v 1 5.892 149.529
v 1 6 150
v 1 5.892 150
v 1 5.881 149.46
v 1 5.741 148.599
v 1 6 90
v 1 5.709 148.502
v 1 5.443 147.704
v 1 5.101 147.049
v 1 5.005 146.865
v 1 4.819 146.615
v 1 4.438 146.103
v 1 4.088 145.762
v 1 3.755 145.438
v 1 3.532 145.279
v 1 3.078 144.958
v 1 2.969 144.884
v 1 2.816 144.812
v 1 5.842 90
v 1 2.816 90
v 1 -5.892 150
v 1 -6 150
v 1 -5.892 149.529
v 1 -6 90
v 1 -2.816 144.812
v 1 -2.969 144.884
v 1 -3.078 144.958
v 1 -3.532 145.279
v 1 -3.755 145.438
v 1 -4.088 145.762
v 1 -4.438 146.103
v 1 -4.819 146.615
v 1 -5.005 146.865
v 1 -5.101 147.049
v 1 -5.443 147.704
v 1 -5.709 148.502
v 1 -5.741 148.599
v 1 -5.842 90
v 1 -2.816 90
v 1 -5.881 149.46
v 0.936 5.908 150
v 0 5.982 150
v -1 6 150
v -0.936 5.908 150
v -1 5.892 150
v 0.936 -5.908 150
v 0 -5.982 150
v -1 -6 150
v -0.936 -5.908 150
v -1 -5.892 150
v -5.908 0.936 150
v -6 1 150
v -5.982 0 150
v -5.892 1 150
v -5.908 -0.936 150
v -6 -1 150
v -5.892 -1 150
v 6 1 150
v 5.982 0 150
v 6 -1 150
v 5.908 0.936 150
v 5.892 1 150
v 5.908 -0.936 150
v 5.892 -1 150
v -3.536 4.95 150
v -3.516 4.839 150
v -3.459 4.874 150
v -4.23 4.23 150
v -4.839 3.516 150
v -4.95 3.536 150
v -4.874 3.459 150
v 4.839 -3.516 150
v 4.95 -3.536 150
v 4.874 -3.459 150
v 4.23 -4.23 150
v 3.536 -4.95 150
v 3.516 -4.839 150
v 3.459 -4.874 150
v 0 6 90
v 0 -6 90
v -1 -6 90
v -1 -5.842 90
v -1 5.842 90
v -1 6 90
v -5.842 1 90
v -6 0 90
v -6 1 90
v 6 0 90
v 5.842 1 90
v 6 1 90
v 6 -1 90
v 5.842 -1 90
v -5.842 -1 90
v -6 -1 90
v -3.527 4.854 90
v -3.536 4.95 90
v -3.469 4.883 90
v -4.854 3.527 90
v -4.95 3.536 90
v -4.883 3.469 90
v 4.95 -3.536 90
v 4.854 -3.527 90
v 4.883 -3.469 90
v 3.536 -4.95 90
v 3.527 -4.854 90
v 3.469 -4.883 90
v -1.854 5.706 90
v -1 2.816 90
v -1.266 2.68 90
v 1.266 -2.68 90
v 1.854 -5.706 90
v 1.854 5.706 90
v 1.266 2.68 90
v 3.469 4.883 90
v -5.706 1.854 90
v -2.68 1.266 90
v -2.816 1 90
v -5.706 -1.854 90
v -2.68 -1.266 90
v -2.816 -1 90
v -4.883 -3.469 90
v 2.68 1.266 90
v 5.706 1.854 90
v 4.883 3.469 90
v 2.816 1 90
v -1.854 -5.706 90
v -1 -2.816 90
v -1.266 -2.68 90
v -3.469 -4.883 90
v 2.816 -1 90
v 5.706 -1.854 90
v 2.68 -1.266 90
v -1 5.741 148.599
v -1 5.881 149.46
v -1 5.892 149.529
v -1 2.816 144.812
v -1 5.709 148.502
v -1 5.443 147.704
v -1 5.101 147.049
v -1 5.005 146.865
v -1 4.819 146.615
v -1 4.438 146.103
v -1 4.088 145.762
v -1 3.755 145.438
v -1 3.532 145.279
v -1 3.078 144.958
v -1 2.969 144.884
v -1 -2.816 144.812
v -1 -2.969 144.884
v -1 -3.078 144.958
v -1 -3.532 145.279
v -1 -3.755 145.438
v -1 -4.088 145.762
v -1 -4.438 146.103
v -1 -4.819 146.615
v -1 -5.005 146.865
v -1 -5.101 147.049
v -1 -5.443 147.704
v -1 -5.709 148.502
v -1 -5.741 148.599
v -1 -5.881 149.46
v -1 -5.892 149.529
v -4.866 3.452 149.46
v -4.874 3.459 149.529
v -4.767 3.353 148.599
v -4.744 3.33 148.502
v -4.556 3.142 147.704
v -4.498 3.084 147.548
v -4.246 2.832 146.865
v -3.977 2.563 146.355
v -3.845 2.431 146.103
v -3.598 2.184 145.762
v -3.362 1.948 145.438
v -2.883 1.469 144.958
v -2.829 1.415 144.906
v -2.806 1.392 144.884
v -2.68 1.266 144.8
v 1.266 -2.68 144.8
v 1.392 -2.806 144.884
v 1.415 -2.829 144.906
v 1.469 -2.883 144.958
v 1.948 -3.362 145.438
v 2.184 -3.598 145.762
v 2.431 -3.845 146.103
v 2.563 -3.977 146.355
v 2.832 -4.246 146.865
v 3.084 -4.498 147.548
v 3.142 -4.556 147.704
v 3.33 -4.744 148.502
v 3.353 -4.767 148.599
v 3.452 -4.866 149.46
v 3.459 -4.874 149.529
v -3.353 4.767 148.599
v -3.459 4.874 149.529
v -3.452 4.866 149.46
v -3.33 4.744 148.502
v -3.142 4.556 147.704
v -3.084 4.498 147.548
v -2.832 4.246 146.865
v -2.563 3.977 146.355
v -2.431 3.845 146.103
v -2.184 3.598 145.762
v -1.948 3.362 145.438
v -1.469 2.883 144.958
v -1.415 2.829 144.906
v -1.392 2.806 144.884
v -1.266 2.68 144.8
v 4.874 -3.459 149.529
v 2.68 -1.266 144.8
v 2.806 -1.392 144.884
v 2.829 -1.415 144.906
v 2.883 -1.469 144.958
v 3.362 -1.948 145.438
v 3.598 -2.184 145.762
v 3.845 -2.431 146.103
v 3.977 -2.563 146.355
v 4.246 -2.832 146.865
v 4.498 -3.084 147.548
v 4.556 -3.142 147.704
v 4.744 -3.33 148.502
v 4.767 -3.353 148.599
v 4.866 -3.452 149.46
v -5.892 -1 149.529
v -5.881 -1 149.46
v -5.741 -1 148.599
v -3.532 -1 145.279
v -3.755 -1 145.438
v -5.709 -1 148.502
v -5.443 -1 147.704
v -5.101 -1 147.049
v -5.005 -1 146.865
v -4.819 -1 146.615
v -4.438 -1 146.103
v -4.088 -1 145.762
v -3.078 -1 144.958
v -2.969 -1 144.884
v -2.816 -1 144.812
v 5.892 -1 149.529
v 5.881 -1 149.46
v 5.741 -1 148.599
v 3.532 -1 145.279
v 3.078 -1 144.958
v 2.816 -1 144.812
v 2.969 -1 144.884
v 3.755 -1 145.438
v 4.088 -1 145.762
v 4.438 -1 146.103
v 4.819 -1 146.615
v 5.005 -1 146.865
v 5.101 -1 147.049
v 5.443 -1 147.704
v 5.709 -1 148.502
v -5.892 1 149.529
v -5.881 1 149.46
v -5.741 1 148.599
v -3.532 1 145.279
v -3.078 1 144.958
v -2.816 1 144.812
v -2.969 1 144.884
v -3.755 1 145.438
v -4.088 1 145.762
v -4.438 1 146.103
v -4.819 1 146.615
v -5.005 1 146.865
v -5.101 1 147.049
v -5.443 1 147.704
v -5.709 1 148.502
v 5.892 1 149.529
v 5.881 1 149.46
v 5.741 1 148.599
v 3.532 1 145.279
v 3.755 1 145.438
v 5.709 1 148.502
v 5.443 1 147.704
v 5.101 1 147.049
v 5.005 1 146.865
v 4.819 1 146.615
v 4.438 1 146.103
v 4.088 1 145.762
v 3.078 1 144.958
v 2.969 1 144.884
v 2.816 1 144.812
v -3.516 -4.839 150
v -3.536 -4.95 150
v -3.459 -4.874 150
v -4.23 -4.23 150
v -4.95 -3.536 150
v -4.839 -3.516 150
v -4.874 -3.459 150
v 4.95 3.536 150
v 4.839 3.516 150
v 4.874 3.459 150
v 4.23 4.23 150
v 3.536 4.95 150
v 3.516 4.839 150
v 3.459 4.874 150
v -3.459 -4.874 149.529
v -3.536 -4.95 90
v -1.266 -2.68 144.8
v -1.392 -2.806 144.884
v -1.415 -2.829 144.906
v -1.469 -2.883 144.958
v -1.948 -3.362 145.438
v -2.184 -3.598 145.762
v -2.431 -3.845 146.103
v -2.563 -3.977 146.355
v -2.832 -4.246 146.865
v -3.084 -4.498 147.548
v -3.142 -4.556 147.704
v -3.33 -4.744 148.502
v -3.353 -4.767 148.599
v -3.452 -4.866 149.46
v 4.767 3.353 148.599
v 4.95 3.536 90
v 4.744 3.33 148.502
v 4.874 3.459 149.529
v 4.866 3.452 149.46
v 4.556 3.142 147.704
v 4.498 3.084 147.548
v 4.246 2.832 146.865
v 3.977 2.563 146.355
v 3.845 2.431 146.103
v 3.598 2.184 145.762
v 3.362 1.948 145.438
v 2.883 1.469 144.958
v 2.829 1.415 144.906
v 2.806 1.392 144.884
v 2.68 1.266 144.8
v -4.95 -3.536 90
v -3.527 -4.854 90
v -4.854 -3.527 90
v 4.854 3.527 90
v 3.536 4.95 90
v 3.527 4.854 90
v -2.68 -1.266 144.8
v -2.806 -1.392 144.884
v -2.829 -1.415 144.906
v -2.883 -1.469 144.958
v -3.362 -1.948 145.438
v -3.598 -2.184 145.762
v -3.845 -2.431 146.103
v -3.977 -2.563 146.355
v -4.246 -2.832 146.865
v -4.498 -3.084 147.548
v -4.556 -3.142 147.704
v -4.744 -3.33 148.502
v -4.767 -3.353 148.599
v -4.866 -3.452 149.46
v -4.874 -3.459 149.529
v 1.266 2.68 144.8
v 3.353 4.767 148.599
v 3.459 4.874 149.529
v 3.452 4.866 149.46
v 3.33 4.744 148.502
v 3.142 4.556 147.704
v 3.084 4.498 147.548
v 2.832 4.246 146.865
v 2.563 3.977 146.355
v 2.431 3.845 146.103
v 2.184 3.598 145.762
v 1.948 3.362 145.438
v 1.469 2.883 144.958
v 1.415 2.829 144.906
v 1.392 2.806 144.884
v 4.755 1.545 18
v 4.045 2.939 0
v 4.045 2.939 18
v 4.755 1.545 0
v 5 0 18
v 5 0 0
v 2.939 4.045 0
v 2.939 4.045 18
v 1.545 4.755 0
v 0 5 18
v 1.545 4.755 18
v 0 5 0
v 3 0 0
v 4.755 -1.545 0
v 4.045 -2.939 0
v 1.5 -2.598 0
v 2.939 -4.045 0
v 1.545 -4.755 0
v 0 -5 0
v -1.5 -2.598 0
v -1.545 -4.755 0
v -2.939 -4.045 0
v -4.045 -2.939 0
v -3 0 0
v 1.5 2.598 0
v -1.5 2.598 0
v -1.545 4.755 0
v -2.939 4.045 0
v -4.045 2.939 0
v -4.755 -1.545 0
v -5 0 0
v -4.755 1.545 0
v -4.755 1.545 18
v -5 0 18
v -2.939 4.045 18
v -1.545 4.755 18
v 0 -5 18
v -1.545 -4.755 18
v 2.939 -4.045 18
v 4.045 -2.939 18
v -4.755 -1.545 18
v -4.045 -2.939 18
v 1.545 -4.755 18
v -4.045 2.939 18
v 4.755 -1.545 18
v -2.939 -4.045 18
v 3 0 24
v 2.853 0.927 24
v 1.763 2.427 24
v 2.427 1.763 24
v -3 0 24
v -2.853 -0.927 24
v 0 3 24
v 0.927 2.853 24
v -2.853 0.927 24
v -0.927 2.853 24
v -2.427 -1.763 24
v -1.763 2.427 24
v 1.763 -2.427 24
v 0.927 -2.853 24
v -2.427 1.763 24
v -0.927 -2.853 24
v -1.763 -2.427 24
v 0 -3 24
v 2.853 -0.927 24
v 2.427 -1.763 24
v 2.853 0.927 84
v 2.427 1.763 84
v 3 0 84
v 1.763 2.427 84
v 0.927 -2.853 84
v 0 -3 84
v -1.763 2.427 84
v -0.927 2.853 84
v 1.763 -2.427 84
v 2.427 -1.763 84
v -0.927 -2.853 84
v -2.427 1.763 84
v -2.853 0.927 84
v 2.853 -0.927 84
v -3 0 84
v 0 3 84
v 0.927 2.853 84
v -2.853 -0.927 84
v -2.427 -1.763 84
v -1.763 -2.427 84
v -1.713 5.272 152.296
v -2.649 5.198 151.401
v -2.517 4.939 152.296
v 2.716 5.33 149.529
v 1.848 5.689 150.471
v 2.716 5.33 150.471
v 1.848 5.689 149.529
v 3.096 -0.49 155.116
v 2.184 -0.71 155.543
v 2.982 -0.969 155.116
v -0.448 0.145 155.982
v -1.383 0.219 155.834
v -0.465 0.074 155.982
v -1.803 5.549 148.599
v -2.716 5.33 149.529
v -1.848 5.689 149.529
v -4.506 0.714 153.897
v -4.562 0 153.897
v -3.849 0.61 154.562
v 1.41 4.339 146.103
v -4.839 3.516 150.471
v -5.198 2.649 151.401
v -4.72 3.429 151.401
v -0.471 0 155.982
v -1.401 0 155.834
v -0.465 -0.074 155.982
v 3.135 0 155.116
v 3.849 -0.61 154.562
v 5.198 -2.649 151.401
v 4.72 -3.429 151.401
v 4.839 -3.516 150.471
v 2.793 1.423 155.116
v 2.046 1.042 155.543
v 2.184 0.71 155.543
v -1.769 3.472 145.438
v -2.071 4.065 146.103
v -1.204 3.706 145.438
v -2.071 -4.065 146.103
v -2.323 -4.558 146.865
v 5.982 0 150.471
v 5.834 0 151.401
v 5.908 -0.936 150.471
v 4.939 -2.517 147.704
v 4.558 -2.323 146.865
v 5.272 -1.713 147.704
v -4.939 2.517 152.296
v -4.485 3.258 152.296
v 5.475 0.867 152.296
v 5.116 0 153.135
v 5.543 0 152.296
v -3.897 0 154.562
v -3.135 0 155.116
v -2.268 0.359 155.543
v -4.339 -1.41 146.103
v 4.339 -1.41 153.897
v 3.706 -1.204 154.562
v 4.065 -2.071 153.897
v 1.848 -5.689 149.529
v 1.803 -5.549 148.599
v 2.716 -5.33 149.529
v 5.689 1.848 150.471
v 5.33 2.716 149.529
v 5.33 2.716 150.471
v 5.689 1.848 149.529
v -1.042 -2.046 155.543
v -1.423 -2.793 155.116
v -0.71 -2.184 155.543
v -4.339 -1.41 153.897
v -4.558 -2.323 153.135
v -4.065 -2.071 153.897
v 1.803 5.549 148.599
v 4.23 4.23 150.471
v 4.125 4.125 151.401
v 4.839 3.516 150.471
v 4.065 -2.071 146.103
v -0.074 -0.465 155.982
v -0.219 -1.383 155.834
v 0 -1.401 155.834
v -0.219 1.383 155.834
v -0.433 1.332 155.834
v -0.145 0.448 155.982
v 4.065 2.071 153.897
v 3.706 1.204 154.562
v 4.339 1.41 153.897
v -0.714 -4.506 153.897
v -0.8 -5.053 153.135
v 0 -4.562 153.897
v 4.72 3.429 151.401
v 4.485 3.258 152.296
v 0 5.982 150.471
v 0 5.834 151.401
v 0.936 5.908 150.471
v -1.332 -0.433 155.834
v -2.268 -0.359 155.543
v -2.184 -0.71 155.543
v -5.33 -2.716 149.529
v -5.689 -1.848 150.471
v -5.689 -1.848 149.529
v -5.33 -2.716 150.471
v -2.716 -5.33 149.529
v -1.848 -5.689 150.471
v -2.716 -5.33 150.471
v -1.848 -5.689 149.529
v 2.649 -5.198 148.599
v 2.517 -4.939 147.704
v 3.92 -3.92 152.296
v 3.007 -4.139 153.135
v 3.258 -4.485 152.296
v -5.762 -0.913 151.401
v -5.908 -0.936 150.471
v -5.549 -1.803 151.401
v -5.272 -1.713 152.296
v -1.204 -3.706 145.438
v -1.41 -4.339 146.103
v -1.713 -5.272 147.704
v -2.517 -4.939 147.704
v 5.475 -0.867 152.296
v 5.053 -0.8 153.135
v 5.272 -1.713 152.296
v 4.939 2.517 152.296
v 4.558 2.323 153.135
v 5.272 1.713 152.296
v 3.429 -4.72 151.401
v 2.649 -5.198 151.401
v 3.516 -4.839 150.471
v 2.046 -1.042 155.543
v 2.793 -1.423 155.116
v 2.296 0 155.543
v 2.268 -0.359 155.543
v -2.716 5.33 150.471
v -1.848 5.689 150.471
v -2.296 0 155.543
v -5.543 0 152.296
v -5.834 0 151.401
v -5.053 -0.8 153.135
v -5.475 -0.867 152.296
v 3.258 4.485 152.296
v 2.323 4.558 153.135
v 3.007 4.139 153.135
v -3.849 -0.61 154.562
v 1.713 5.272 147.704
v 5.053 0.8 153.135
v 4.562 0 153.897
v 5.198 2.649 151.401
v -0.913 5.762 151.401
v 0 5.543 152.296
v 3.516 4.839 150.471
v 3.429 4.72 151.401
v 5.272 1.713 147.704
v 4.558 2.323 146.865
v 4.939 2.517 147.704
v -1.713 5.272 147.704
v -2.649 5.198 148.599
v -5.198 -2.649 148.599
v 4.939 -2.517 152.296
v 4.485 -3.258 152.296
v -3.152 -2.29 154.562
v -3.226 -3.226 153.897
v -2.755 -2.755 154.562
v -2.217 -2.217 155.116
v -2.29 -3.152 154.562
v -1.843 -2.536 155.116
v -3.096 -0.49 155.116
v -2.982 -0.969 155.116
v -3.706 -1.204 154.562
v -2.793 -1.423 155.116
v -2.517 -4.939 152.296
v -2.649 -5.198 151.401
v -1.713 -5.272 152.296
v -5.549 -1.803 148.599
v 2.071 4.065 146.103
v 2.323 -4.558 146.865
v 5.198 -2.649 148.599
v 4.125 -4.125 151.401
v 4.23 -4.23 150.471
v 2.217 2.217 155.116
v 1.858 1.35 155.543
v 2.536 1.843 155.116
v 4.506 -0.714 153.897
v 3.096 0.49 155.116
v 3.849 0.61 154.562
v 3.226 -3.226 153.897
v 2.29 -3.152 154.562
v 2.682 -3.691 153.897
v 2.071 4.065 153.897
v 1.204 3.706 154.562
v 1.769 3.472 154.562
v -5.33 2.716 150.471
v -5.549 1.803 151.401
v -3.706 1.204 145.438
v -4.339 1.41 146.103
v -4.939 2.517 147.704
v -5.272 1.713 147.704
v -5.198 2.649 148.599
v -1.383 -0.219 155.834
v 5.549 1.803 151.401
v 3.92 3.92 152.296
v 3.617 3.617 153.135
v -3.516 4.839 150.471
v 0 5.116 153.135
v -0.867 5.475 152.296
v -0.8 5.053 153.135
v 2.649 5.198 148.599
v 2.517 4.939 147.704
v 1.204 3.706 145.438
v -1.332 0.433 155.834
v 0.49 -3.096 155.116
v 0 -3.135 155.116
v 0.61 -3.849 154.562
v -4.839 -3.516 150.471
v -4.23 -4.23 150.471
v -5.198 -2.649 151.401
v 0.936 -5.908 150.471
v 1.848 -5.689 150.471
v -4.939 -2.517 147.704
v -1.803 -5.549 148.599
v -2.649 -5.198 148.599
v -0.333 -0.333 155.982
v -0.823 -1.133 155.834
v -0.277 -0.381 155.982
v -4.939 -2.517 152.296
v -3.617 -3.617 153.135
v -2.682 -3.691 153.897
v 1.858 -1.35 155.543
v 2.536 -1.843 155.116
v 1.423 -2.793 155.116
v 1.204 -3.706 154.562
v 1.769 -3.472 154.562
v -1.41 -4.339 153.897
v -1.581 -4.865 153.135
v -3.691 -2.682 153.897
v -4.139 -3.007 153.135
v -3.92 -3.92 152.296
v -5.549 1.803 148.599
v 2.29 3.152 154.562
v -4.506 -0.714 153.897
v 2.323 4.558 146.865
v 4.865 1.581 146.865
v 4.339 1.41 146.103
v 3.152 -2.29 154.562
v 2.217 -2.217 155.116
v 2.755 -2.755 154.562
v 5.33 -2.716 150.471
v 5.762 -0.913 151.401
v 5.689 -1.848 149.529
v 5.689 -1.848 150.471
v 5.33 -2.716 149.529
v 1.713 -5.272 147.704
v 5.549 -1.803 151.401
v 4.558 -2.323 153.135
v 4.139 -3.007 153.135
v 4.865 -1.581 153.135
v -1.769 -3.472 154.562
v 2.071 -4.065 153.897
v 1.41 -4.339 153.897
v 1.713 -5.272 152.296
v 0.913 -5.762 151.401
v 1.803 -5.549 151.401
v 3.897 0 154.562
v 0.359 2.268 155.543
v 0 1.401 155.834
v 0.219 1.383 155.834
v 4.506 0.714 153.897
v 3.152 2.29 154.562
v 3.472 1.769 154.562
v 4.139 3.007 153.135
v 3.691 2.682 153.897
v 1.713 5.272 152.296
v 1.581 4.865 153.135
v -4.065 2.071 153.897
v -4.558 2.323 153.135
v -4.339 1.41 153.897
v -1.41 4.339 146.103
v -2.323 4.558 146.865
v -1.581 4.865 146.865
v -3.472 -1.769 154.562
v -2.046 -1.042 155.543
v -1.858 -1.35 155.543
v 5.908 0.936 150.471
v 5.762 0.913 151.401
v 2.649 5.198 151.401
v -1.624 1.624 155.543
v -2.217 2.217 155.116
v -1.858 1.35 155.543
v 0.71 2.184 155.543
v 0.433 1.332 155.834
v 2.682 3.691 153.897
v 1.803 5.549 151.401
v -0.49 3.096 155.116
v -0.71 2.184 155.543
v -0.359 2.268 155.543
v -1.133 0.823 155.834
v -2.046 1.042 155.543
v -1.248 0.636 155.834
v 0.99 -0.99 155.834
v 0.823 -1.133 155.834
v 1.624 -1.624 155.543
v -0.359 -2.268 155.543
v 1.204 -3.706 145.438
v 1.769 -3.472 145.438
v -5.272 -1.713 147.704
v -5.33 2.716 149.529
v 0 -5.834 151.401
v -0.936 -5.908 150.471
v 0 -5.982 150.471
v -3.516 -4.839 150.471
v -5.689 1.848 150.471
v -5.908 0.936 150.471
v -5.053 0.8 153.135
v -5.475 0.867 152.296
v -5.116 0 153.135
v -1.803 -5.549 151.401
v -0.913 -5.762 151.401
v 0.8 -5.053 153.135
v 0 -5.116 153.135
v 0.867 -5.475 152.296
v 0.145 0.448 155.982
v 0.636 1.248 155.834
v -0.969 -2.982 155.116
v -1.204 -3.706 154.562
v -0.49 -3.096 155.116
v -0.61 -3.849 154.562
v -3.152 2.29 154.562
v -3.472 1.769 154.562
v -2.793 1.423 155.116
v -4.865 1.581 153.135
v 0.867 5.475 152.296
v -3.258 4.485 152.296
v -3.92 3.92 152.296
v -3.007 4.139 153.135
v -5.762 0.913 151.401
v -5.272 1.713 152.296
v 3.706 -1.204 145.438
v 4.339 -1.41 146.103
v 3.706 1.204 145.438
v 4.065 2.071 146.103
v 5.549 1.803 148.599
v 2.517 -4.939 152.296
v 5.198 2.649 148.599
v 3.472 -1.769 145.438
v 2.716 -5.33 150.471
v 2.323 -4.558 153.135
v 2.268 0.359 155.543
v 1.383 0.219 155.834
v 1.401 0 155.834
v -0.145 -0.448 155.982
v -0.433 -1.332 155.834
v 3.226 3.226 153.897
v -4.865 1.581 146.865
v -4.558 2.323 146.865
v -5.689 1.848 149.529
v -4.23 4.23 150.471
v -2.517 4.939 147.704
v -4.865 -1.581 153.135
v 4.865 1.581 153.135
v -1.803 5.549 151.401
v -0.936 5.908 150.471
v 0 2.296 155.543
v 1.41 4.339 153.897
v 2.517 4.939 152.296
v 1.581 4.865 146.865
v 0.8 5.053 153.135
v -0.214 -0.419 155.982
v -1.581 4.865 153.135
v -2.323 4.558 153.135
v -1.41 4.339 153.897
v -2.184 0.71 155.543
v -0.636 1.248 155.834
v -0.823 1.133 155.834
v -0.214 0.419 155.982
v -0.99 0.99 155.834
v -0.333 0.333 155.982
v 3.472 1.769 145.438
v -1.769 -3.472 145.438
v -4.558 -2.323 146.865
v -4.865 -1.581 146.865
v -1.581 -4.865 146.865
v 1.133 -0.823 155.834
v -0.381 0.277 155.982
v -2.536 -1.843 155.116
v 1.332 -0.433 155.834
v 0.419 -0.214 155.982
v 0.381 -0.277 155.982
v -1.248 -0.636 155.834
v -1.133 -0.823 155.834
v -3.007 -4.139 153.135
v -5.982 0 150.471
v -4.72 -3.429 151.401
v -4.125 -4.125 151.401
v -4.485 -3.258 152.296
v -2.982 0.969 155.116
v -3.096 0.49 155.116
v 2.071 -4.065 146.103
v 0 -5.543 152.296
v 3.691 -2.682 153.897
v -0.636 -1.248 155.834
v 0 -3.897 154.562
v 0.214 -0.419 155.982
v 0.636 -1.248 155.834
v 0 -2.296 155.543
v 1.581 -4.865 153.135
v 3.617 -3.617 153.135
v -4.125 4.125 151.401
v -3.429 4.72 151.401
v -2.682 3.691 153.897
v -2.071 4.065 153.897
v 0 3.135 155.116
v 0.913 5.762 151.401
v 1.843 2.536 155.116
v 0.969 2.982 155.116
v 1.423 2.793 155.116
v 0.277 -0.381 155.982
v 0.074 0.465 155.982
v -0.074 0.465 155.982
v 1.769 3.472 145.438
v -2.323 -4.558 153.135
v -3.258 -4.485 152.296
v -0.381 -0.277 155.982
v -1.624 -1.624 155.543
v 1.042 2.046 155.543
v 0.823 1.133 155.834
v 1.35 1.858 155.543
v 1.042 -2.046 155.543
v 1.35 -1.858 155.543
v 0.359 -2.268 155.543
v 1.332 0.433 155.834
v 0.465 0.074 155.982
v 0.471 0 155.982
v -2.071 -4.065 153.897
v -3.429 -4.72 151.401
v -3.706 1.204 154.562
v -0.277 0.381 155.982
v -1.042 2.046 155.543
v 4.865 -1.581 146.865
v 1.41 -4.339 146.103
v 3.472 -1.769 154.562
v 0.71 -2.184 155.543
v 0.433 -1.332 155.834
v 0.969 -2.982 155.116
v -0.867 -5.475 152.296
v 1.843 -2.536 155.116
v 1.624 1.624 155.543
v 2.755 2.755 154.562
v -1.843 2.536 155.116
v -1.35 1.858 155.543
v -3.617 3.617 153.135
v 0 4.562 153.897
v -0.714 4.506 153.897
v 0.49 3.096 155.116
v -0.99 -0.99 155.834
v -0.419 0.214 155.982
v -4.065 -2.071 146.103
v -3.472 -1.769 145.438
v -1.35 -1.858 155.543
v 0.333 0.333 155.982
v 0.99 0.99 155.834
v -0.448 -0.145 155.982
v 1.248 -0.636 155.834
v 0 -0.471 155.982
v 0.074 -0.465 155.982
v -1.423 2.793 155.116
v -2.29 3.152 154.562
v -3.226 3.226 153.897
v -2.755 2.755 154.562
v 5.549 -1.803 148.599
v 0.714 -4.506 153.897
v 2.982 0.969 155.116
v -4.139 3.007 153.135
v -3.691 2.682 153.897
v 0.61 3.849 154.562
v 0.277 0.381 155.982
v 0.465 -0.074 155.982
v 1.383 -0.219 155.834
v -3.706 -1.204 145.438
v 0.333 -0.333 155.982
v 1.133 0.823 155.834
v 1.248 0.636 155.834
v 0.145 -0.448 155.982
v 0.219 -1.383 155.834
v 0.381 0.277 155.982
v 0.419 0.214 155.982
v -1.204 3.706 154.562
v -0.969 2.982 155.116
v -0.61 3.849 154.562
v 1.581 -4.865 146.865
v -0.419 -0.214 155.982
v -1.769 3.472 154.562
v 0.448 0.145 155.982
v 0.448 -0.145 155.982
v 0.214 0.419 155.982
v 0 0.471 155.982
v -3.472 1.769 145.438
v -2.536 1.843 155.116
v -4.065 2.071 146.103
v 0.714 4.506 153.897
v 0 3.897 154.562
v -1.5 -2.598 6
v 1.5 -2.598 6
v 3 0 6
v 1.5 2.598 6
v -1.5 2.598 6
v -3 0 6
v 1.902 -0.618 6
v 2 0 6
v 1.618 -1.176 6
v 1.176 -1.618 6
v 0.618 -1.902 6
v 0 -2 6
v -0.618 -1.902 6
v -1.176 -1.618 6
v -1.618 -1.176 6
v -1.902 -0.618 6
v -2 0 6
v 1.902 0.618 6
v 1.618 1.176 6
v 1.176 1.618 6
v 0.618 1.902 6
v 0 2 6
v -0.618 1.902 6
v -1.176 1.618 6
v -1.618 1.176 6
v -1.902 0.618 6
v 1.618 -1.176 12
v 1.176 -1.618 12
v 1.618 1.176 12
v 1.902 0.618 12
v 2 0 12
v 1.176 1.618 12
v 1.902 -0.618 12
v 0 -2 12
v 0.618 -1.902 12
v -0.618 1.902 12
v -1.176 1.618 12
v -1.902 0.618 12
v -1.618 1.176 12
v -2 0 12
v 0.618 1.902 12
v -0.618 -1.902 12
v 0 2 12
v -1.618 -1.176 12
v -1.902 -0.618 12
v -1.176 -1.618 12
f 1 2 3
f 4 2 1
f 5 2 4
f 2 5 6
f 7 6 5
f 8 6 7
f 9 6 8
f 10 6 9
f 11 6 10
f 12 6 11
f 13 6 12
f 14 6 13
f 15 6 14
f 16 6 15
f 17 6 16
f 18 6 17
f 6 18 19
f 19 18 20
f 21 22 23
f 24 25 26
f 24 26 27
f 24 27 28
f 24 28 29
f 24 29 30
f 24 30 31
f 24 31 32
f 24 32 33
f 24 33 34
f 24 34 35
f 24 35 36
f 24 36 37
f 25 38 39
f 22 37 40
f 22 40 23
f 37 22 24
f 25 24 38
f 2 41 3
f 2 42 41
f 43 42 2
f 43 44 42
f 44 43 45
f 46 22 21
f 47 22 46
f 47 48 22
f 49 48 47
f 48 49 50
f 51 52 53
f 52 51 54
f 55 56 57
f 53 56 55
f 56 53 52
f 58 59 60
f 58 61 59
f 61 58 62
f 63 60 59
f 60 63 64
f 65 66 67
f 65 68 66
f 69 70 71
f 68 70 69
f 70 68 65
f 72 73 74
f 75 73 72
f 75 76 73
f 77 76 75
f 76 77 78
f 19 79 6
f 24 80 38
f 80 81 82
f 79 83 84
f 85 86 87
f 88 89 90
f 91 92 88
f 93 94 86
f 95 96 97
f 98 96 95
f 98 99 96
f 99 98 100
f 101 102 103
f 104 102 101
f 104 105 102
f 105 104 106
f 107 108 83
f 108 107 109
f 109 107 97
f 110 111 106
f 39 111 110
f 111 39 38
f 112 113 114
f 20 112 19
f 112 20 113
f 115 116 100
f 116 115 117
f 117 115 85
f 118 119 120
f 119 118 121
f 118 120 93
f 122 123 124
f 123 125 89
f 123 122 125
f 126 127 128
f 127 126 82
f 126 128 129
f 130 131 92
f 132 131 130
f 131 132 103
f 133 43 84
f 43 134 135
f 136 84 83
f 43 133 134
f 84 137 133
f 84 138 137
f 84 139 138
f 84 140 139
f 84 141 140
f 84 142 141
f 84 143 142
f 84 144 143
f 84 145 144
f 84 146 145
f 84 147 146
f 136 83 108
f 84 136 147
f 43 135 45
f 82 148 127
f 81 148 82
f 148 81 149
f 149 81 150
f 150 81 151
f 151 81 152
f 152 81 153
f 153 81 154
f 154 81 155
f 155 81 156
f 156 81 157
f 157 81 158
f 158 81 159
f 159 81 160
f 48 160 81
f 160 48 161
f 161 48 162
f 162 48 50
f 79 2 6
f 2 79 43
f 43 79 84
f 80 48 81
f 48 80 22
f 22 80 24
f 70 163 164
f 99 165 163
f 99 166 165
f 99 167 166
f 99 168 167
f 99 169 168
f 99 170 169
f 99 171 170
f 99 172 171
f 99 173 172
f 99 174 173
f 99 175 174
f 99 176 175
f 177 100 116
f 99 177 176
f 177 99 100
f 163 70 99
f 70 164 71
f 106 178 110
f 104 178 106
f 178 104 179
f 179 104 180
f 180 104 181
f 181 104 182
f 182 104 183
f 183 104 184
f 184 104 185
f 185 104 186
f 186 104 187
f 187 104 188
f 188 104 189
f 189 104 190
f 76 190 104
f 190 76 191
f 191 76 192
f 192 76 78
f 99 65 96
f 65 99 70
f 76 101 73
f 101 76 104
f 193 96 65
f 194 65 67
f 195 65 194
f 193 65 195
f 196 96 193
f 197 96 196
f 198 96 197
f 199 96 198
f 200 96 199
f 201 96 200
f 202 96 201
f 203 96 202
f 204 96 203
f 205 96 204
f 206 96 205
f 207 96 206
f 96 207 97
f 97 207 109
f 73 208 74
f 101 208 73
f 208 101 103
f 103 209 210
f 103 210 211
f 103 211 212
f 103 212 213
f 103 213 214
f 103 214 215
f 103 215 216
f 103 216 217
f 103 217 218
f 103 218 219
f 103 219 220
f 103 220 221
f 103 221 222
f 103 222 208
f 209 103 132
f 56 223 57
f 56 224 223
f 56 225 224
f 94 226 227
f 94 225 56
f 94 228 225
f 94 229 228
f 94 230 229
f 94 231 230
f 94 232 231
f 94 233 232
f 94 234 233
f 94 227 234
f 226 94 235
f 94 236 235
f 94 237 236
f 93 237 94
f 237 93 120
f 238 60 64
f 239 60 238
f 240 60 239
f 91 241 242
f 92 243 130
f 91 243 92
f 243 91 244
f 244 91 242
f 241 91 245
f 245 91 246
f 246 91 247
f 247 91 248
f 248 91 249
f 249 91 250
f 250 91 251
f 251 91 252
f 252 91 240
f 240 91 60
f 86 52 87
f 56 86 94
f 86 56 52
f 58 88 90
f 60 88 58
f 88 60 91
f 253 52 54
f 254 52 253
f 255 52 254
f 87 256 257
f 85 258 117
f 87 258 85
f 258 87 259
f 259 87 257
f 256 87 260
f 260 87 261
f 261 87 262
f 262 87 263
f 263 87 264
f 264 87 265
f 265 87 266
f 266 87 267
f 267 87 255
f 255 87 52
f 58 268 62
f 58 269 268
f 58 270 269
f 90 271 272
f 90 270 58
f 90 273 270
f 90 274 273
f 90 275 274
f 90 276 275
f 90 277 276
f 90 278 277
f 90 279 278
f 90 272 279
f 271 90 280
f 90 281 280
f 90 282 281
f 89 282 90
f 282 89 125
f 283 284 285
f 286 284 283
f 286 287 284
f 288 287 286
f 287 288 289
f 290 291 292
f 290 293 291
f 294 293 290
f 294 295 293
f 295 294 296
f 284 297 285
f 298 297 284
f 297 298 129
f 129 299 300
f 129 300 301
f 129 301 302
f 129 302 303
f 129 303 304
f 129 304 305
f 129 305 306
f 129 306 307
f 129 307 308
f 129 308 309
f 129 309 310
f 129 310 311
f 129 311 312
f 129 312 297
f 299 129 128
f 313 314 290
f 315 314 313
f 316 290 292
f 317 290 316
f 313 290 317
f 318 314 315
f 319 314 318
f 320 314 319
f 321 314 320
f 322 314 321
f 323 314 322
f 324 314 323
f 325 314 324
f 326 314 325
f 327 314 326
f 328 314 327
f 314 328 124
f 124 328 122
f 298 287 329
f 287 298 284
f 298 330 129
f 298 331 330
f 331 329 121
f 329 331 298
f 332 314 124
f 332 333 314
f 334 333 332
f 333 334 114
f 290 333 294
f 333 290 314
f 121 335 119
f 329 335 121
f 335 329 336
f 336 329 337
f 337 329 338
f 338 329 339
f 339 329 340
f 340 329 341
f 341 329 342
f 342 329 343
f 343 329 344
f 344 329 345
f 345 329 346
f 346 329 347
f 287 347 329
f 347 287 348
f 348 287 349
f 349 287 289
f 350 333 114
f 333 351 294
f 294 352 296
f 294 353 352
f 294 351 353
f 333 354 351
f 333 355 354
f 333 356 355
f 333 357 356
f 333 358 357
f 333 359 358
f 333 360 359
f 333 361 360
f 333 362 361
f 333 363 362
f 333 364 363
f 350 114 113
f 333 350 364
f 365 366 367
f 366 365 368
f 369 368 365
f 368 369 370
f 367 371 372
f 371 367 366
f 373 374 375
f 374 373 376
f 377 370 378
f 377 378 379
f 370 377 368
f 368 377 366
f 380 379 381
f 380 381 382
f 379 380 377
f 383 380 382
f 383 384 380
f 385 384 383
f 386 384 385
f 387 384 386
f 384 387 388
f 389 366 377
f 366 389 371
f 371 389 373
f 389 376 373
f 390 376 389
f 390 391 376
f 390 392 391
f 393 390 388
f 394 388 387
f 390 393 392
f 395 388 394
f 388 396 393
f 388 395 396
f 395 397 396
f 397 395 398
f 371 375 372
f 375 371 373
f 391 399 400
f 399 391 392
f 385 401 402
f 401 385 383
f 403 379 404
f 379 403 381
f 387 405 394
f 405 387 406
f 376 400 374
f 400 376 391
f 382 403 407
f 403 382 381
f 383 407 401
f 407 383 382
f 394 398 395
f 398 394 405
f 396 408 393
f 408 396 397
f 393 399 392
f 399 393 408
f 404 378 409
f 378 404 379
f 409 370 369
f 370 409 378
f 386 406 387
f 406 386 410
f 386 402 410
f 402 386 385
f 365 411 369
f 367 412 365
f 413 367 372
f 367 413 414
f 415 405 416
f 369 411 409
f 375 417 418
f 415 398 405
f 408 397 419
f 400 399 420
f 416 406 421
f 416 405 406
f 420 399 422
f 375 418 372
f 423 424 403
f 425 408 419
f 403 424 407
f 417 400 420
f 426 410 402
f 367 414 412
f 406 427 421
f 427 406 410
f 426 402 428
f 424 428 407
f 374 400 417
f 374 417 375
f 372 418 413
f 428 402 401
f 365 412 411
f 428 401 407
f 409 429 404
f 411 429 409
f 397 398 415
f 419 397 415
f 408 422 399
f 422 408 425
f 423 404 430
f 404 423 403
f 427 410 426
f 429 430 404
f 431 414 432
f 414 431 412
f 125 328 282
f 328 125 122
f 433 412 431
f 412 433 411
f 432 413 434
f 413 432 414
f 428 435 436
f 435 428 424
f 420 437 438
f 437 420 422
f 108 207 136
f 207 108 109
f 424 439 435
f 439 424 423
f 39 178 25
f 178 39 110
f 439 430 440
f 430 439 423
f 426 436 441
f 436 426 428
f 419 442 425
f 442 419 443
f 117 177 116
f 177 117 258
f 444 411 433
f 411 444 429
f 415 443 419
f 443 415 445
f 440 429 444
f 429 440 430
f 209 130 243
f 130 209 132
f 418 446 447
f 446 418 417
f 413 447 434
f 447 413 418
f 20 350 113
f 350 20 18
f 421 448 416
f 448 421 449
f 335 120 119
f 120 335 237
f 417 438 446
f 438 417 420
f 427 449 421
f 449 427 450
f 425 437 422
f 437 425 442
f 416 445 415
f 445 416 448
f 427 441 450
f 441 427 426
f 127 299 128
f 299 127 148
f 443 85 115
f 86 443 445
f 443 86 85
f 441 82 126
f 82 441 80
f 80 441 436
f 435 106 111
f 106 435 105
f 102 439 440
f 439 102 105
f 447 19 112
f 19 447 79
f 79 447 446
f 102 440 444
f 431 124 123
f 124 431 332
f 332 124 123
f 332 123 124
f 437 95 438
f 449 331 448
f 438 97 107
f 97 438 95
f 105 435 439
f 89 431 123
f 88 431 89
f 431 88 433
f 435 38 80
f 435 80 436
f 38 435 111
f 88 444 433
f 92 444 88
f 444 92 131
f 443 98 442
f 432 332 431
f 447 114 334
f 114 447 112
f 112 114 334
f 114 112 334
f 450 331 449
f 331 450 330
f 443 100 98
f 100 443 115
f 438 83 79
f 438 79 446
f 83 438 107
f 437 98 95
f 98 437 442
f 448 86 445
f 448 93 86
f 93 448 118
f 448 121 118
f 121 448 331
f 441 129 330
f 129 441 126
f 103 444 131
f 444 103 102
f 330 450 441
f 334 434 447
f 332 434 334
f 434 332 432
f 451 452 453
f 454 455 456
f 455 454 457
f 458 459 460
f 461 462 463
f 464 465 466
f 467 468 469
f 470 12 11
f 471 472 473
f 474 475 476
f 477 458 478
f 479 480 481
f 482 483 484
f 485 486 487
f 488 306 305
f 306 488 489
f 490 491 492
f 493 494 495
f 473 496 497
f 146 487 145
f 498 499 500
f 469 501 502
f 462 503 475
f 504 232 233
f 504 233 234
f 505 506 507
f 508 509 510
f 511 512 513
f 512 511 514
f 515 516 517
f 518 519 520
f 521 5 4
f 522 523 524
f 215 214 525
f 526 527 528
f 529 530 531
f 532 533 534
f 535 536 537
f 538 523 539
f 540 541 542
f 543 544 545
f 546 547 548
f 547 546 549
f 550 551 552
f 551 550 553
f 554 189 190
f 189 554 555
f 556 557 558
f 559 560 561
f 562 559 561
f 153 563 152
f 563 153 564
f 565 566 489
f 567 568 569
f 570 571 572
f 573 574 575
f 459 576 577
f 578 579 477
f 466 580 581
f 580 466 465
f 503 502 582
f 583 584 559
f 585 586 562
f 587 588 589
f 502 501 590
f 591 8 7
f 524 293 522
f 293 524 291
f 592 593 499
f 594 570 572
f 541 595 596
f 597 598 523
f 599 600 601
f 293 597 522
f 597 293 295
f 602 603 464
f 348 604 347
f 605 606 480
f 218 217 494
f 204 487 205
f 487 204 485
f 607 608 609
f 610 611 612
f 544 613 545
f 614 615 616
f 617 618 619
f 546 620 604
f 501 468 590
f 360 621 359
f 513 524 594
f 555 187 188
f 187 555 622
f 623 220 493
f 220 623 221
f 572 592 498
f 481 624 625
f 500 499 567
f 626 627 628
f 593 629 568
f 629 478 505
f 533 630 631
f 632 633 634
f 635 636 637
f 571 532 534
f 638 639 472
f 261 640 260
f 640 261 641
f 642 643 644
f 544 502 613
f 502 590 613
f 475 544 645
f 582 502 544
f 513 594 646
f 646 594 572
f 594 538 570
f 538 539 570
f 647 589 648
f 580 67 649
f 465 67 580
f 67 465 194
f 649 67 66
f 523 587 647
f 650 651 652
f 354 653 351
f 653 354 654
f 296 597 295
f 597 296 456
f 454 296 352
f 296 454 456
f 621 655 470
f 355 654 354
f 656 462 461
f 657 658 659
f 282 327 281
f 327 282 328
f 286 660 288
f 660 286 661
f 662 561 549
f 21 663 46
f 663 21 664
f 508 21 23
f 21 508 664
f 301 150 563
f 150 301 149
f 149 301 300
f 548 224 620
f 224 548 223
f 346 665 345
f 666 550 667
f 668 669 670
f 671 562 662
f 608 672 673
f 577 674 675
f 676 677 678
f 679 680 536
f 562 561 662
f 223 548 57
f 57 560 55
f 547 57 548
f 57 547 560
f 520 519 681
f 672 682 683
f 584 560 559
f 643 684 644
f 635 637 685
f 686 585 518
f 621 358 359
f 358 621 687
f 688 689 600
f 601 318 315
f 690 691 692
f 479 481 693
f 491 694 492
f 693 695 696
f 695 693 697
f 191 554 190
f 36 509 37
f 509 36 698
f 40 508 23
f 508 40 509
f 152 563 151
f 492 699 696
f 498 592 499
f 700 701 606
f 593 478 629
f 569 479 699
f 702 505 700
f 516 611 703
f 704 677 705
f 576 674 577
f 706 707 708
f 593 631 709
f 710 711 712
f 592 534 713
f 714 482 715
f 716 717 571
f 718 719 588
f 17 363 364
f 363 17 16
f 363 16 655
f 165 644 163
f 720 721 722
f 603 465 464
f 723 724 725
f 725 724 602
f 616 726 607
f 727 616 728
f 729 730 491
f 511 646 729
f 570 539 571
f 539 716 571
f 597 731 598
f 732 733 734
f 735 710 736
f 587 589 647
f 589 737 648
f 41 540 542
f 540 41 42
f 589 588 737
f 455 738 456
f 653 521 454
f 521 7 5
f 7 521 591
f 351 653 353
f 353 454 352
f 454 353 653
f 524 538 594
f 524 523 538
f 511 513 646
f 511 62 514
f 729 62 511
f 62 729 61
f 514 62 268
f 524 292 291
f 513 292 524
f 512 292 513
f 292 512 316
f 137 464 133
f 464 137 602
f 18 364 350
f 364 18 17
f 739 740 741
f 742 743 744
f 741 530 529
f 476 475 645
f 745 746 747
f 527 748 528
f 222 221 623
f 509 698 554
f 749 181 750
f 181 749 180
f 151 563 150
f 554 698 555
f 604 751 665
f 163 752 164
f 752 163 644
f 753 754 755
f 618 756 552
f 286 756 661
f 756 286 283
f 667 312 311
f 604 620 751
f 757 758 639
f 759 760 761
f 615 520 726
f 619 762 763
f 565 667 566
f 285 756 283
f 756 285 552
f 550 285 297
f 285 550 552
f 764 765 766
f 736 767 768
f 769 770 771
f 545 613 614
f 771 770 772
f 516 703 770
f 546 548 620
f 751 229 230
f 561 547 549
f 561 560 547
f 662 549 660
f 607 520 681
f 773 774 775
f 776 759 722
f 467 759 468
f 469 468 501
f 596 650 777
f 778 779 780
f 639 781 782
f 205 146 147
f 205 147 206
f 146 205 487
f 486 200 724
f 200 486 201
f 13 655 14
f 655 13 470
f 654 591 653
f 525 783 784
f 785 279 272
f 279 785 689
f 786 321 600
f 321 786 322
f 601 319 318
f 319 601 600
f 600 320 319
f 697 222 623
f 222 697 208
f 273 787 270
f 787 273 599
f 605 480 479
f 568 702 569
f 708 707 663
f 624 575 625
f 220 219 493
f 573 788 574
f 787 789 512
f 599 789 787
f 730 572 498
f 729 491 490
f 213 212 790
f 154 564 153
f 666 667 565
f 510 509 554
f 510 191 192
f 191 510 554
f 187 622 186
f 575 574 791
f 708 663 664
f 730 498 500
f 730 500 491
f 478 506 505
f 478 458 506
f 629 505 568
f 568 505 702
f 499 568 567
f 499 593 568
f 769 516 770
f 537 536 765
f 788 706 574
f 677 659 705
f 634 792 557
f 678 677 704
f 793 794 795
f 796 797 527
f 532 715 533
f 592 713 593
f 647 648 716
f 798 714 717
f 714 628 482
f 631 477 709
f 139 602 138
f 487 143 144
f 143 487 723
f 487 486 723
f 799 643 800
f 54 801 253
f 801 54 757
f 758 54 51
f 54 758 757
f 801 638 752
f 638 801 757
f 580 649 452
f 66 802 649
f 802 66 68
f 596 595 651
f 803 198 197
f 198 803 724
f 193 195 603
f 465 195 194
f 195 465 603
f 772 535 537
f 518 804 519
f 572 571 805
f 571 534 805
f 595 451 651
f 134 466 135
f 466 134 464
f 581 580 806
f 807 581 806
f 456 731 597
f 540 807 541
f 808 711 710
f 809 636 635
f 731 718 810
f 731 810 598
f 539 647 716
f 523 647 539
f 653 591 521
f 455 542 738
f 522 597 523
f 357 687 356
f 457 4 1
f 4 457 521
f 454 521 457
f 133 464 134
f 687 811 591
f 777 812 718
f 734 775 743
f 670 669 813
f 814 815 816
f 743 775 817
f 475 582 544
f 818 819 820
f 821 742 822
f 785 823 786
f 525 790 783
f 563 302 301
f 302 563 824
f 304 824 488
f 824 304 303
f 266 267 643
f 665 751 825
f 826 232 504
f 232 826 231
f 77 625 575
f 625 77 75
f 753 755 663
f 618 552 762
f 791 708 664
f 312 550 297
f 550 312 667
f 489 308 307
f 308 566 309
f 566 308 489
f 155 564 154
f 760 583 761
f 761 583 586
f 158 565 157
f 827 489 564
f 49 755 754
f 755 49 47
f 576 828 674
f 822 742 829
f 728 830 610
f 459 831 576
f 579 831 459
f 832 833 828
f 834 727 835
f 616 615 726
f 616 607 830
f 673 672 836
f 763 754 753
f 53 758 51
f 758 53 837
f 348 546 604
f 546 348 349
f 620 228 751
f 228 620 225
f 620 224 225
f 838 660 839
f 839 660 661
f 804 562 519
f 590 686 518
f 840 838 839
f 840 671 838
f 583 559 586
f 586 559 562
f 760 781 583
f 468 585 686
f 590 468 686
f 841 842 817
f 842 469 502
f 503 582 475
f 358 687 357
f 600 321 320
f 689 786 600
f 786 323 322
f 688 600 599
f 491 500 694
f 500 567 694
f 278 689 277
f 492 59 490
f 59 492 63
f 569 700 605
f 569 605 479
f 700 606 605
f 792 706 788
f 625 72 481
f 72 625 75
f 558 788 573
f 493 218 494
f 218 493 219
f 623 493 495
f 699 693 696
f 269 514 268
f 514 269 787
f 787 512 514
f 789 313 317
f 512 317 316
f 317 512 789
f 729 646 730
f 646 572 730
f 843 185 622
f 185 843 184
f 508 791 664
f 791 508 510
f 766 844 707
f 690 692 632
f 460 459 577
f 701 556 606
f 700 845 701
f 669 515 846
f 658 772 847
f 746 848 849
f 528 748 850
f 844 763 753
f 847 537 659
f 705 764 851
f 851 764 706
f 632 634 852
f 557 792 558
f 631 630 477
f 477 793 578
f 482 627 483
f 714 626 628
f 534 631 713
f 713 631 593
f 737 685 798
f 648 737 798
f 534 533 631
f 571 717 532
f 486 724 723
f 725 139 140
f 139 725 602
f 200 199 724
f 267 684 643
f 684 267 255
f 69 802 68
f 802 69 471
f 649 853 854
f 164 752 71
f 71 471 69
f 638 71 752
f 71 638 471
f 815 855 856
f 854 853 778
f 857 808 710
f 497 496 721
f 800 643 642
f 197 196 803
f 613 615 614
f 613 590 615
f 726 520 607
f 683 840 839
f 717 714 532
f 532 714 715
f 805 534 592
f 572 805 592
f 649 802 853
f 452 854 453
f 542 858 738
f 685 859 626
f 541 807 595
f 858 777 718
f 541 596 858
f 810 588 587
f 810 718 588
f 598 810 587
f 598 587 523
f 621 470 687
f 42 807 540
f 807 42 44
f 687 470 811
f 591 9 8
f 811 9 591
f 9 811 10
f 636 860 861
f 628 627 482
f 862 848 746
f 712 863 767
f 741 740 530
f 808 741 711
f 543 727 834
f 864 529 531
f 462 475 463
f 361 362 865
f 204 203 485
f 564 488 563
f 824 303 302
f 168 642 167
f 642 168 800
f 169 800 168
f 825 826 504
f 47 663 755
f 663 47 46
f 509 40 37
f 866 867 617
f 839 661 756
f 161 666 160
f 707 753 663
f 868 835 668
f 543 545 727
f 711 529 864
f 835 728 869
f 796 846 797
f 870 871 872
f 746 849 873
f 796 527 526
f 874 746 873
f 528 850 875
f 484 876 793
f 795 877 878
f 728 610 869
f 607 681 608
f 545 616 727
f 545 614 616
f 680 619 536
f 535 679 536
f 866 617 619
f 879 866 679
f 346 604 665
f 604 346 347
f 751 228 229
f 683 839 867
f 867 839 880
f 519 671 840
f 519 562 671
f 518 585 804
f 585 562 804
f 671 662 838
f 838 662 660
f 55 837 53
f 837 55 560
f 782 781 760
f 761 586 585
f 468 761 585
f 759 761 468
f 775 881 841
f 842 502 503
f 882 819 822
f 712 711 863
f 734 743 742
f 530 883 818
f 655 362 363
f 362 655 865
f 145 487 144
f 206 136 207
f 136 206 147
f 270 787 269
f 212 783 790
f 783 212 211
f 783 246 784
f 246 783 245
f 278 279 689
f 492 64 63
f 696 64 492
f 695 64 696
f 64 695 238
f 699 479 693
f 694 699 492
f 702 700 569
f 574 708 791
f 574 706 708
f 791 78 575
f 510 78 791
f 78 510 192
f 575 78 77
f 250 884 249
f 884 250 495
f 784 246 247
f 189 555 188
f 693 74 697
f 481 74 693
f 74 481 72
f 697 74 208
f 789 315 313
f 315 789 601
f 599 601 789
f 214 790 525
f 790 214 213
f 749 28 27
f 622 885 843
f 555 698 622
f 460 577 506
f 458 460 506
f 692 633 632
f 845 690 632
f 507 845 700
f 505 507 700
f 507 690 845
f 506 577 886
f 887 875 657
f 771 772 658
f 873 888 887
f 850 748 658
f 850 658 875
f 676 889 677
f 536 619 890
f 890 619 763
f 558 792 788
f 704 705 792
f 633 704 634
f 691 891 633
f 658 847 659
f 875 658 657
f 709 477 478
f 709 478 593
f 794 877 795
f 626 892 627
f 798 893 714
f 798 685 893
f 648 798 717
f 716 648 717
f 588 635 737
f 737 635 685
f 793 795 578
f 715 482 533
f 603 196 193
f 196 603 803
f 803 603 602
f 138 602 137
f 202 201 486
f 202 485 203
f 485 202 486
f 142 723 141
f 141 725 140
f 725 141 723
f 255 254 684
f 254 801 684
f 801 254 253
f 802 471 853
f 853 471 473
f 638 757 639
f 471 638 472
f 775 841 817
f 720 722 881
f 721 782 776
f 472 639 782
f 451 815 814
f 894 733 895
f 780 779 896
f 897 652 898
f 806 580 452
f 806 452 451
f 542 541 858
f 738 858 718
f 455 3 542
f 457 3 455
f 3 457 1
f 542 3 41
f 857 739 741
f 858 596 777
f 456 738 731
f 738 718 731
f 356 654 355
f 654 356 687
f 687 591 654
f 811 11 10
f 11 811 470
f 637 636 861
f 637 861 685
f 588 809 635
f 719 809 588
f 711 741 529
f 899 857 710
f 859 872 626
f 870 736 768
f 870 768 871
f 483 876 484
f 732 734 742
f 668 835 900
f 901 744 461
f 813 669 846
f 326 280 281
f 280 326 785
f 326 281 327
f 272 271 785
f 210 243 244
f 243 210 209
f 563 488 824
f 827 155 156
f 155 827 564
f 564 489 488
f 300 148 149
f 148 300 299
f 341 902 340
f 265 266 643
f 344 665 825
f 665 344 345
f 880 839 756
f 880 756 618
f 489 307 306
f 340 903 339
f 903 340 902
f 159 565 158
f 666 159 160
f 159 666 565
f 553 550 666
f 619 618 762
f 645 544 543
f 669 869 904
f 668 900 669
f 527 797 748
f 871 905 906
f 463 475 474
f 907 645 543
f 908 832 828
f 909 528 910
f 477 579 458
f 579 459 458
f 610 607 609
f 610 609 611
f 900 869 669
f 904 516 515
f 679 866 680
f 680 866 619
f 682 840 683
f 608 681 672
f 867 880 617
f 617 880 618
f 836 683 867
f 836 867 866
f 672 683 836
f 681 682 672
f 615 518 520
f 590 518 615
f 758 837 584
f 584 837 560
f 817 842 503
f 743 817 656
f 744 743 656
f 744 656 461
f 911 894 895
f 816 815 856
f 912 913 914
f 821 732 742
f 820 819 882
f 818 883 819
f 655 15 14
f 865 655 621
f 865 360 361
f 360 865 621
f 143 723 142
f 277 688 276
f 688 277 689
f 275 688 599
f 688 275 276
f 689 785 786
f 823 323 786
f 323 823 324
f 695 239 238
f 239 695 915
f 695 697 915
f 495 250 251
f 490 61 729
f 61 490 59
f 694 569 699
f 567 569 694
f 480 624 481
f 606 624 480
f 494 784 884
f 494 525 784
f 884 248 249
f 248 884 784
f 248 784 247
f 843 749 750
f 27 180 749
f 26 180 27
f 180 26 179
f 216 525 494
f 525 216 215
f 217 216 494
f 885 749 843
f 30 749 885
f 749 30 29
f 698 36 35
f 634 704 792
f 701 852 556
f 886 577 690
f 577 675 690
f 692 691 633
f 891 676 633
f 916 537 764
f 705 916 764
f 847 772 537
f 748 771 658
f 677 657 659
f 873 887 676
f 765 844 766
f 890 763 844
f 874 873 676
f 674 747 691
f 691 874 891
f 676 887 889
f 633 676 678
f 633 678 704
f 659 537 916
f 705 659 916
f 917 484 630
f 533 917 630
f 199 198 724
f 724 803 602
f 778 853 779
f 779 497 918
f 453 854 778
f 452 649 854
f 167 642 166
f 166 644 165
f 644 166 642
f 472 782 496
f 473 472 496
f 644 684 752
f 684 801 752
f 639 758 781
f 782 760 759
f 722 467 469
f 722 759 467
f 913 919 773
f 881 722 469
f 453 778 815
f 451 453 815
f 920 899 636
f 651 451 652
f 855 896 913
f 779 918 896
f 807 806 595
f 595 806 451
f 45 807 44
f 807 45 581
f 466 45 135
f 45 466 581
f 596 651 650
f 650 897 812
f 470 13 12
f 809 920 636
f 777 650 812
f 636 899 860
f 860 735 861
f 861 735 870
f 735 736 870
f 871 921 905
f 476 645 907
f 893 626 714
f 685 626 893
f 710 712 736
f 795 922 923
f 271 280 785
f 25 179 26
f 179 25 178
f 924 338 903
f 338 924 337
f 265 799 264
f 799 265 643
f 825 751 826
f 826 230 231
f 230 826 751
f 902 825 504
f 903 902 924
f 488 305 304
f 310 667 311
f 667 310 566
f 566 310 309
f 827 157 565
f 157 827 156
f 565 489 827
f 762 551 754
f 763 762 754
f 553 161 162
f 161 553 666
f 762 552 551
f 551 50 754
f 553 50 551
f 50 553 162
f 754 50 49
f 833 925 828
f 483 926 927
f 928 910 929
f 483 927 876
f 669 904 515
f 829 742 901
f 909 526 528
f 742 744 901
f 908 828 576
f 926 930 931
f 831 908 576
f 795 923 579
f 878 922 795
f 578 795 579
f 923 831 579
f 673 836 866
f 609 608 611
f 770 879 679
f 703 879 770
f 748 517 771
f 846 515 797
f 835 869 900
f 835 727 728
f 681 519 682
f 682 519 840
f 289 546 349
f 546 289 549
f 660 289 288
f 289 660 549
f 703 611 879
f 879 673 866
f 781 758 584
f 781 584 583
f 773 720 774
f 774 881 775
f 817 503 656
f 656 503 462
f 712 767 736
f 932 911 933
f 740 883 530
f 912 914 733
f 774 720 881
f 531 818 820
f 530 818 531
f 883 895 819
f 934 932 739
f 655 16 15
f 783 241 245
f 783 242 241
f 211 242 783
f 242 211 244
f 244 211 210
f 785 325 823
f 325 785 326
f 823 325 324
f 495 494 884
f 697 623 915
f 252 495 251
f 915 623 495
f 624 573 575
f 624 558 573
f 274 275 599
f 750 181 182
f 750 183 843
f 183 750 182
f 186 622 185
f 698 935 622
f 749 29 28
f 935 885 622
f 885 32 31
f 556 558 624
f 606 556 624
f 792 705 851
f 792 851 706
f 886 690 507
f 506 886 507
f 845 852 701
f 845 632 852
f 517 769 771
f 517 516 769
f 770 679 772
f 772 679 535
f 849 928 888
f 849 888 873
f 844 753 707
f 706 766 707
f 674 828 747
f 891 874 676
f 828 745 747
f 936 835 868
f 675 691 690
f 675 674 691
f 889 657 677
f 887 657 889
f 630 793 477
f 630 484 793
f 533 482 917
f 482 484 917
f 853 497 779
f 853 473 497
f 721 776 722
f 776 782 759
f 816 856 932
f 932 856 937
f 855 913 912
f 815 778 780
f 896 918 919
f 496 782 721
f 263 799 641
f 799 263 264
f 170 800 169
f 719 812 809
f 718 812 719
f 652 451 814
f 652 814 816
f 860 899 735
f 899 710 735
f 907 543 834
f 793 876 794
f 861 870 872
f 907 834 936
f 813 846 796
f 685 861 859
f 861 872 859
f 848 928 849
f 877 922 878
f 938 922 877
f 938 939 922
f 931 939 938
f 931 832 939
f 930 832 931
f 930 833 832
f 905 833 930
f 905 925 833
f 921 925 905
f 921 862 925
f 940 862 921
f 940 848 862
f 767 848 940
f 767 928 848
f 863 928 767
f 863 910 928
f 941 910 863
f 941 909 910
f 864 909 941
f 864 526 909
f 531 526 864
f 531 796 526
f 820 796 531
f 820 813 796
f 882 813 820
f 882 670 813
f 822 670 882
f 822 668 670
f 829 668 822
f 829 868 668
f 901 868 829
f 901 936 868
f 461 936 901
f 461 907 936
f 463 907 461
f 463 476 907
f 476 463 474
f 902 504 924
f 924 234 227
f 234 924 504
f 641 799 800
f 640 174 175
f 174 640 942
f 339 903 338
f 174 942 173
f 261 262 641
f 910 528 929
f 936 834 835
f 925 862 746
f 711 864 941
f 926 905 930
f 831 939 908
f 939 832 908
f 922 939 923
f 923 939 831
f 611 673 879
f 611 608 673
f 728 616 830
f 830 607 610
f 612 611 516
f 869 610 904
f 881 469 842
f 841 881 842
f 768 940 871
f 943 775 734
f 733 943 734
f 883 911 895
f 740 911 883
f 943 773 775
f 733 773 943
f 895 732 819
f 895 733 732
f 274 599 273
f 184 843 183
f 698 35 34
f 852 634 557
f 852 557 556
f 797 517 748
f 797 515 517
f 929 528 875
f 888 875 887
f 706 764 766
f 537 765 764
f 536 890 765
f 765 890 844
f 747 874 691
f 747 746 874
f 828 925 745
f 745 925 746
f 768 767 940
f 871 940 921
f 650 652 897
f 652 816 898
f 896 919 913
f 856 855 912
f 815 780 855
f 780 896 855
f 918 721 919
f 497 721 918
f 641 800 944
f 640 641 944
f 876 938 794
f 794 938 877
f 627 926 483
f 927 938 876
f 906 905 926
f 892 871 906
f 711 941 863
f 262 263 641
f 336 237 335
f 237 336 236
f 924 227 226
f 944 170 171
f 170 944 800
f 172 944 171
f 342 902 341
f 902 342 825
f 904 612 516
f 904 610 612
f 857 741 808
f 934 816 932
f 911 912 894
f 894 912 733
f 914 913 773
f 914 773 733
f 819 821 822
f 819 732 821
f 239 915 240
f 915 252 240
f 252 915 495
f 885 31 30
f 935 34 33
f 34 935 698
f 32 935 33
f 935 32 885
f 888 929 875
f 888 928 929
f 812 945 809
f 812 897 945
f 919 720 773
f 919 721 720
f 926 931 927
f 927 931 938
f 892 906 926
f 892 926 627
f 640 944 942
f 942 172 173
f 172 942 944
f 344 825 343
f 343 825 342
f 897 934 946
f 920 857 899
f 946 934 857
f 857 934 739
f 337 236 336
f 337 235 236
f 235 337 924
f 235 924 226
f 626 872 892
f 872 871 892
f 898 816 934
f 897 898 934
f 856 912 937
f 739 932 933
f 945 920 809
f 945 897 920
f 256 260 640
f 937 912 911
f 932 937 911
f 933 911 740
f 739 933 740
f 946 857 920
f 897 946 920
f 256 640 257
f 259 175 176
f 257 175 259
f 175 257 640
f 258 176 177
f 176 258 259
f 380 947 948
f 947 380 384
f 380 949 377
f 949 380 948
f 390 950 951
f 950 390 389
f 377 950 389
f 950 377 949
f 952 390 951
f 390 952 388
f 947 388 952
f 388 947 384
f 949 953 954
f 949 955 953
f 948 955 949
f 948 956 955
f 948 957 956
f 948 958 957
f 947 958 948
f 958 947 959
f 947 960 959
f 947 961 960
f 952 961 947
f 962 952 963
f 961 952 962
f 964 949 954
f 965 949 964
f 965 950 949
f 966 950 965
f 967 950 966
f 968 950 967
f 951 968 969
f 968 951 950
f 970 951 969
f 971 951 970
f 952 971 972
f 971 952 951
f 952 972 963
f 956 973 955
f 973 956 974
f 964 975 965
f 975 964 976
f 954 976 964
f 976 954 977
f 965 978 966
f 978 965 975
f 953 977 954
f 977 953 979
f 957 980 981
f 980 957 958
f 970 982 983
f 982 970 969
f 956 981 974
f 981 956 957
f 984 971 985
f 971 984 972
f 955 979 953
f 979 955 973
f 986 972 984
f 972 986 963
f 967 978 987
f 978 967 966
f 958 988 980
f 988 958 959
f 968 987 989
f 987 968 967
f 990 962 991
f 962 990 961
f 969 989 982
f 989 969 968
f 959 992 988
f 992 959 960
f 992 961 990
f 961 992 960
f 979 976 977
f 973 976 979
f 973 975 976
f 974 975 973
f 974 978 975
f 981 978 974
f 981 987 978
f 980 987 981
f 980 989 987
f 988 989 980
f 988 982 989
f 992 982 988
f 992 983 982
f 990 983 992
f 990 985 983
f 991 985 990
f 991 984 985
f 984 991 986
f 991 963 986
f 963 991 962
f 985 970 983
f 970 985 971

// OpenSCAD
// André Groß
// www.andre-gross.de
// andregro (a) students. uni-mainz.de


nut = 6;
height = 150;
handleHeight = 60;
handleDiameter = 12;
shaftDiameter = 6;
wrench(nut,height,handleHeight,handleDiameter,shaftDiameter);
module wrench(nut,height,handleHeight,handleDiameter,shaftDiameter) {
	difference(){
		union(){
			cylinder(h=nut*3,r=nut/2+2,$fn=20);
			translate([0,0,nut*3])cylinder(h=nut,r1=nut/2+2,r2=shaftDiameter/2,$fn=20);
			cylinder(h=height,r=shaftDiameter/2,$fn=20);
			translate([0,0,height-handleHeight-nut])cylinder(h=nut,r1=shaftDiameter/2,r2=handleDiameter/2,$fn=20);
			for (i=[0:3]) {
				rotate(i*45)translate([-handleDiameter/12,-handleDiameter/2,height-handleHeight])cube([handleDiameter/6,handleDiameter,handleHeight]);
			}
			translate([0,0,height])sphere(handleDiameter/2,$fn=40);
		}
		cylinder(h=nut,r=nut/2,$fn=6);
		cylinder(h=nut*2,r=nut/3,$fn=20);
	}
}
